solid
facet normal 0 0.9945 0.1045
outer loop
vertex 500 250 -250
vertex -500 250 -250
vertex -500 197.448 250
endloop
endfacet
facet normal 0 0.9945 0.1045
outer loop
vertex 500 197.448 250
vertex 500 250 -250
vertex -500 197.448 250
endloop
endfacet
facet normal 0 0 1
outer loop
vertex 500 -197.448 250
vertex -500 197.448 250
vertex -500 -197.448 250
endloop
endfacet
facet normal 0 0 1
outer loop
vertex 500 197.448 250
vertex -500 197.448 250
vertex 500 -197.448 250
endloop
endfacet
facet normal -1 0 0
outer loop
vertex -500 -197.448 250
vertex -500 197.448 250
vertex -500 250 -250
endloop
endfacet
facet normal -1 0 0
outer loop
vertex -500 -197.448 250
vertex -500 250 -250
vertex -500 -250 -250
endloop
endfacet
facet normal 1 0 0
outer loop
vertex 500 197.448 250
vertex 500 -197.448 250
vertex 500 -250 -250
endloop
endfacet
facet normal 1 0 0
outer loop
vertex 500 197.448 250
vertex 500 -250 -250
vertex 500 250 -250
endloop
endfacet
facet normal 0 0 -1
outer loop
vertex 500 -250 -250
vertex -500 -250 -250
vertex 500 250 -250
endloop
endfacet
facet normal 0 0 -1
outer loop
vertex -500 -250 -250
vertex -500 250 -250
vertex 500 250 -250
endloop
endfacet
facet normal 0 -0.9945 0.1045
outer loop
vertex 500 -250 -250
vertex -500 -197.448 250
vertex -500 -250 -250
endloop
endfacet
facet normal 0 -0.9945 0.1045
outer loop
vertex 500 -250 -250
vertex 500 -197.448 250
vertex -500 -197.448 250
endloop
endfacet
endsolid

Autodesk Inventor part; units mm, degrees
sketch "Sketch5" plane through (0, 0, 0) normal (0, 0, 1) x (1, 0, 0)
  line L0 (-500, -250) -> (500, -250)
  line L1 (500, -250) -> (500, 250)
  line L2 (500, 250) -> (-500, 250)
  line L3 (-500, 250) -> (-500, -250)
  line L4 (-500, -250) -> (500, 250) construction
  line L5 (500, -250) -> (-500, 250) construction
  point P0 (0, 0)
  dimension "d11" = 1000
  dimension "d12" = 500
extrude "Extrusion3" add sketch "Sketch5" along normal mid plane 500
sketch "Sketch6" plane through (500, -250, 250) normal (1, 0, 0) x (0, 0, -1)
  line L0 (0, 0) -> (0, 500) construction
  line L1 (500, 0) -> (500, 500) construction
  line L2 (0, 52.5521) -> (500, 0)
  line L3 (500, 0) -> (0, 0)
  line L4 (0, 0) -> (0, 52.5521)
  point P0 (250, 250)
  dimension "d15" = 6
extrude "Extrusion4" cut sketch "Sketch6" against normal up to next
mirror "Mirror2" about plane through (0, 0, 0) normal (0, 1, 0) of "Extrusion4"
sketch "Sketch7" plane through (-500, -250, -250) normal (0, -0.9945, 0.1045) x (1, 0, 0)
  line L0 (0, 402.7541) -> (1000, 315.2655)
  line L1 (1000, 502.7541) -> (1000, 0) construction
  line L2 (0, 502.7541) -> (1000, 502.7541) construction
  line L3 (0, 0) -> (0, 502.7541) construction
  point P0 (500, 274.7626)
  dimension "d18" = 5
  dimension "d19" = 100
sketch "Sketch8" plane through (-500, -250, -250) normal (0, -0.9945, 0.1045) x (1, 0, 0)
  line L0 (0, 0) -> (0, 502.7541) construction
  line L1 (0, 90) -> (1000, 212.7846)
  line L2 (1000, 502.7541) -> (1000, 0) construction
  line L3 (1000, 0) -> (0, 0) construction
  point P0 (500, 274.7626)
  dimension "d20" = 7
  dimension "d21" = 90
properties part number "Telaio"
